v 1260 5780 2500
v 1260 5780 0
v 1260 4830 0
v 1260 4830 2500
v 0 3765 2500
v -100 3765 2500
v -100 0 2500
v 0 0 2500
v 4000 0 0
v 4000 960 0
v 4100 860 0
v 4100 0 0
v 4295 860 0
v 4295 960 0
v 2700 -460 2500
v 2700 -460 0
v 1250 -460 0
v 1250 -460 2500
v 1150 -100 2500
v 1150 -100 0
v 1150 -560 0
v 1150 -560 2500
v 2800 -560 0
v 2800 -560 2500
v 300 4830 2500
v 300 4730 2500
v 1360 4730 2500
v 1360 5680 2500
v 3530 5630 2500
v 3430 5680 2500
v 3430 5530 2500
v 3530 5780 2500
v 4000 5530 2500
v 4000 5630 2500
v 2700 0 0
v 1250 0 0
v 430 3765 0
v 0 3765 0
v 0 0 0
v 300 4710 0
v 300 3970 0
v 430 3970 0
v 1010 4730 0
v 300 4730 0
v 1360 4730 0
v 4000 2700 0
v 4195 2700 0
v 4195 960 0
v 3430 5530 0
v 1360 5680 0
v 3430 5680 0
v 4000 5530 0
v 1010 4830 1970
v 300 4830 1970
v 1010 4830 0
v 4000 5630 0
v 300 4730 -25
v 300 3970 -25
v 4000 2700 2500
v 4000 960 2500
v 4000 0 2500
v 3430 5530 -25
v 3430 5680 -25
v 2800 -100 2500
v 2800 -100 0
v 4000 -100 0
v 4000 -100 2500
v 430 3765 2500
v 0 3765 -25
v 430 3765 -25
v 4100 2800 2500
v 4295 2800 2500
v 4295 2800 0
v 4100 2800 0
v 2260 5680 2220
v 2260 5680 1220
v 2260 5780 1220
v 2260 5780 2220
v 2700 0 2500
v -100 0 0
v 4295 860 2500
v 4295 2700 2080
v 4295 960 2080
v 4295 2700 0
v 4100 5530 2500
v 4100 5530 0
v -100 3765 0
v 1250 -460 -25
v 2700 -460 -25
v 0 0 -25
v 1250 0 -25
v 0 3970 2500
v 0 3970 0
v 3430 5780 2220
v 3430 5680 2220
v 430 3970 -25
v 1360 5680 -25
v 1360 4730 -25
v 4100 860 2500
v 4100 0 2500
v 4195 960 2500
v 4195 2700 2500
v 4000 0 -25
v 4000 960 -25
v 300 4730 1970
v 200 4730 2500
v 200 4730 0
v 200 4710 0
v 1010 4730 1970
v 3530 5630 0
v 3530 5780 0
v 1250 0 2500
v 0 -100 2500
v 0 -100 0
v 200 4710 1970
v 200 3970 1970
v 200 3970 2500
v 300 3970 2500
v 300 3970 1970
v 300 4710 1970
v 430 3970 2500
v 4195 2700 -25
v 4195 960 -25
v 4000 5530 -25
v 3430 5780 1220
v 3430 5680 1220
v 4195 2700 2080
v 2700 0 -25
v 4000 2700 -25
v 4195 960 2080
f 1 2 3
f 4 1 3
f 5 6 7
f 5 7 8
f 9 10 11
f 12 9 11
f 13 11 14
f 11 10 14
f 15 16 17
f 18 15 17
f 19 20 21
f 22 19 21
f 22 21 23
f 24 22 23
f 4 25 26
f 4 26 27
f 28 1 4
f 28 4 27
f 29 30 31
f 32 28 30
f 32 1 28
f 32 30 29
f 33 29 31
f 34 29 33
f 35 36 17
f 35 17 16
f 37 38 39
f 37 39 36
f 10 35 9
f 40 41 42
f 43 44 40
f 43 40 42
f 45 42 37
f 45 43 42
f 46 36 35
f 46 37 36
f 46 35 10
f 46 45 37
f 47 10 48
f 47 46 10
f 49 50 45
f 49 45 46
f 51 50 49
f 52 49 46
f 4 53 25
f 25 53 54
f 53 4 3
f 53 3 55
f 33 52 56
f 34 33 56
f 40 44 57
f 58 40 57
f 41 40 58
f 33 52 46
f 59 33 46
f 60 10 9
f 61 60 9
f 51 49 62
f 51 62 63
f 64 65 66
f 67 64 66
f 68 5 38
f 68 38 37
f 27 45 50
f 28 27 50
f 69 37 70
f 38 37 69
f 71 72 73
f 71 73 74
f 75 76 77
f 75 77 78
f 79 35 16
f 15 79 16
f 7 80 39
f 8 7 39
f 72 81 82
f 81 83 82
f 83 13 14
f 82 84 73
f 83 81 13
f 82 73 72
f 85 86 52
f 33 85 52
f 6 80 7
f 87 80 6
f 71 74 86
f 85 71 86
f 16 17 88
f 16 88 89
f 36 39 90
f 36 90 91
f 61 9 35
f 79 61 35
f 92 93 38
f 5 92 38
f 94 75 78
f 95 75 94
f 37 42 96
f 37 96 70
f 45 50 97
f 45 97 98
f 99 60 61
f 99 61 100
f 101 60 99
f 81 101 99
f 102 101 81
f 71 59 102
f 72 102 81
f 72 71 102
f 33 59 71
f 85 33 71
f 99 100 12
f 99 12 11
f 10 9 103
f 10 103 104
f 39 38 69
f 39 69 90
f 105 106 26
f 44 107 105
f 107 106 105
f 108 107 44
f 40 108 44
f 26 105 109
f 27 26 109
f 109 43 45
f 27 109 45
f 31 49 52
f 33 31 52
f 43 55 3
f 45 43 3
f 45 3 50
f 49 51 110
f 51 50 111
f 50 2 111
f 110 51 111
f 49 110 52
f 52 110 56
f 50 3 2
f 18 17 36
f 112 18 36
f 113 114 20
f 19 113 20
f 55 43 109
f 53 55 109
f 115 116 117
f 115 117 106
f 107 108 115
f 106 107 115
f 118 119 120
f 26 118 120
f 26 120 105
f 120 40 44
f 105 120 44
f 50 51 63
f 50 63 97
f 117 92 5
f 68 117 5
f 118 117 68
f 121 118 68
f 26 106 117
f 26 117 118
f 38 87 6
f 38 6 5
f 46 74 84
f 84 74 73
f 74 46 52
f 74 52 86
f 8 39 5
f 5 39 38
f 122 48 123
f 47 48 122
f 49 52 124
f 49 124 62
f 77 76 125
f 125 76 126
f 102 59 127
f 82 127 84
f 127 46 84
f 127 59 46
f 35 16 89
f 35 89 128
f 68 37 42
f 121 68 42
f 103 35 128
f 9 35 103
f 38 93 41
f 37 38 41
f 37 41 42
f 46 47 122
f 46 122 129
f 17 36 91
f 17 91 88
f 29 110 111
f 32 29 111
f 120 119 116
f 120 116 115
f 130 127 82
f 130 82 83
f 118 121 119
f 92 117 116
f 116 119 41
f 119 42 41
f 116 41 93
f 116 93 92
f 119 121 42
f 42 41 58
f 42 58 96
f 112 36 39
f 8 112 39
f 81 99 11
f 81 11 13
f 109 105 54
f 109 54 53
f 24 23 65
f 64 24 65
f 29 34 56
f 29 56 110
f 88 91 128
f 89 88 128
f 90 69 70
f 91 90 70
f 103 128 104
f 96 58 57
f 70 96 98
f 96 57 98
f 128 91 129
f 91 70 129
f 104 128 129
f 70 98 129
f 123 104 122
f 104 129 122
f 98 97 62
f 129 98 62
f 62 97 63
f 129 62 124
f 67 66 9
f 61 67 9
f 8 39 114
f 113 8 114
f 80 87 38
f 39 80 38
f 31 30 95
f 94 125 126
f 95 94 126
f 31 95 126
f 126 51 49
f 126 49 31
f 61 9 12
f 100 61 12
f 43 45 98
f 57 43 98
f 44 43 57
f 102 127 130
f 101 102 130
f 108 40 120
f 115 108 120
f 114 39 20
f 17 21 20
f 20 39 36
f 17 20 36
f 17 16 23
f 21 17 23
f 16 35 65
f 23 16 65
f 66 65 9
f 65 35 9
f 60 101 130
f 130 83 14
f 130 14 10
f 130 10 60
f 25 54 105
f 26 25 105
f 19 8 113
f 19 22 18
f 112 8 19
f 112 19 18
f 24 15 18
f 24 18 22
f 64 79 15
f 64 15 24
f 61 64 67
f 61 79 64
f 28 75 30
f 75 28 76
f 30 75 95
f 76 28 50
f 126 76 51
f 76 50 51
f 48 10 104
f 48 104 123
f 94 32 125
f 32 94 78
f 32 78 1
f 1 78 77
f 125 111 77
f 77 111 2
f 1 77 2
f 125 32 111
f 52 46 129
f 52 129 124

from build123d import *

# Parameters (mm, degrees)
F1_DEPTH  = 25
F2_W      = 100
F2_H      = 3765
F3_DEPTH  = 2500
F5_DEPTH  = 2500
F7_DEPTH  = 2500
F9_DEPTH  = 2500
F11_DEPTH = 2500
F12_W     = 100
F12_H     = 760
F13_DEPTH = 2500
F14_W     = 1170
F14_H     = 1000
F15_DEPTH = 100.001
F16_W     = 740
F16_H     = 1970
F17_DEPTH = 400.001
F18_W     = 710
F18_H     = 1970
F19_DEPTH = 1050.001
F20_W     = 1740
F20_H     = 2080
F21_DEPTH = 100.001


with BuildPart() as f1:
    # F0 (on Top) → F1 (new body)
    with BuildSketch(Plane.XY):
        Polygon((0, 3765), (0, 0), (1250, 0), (1250, -460), (2700, -460), (2700, 0), (4000, 0), (4000, 960), (4195, 960), (4195, 2700), (4000, 2700), (4000, 5530), (3430, 5530), (3430, 5680), (1360, 5680), (1360, 4730), (300, 4730), (300, 3970), (430, 3970), (430, 3765), align=None)
    extrude(amount=-F1_DEPTH)



with BuildPart() as f3:
    # F2 (on face) → F3 (new body)
    with BuildSketch(Plane.XY):
        with Locations((-50, 1882.5)):
            Rectangle(F2_W, F2_H)
    extrude(amount=F3_DEPTH)


with BuildPart() as f5:
    # F4 (on face) → F5 (new body)
    with BuildSketch(Plane.XY):
        Polygon((1250, 0), (0, 0), (0, -100), (1150, -100), (1150, -560), (2800, -560), (2800, -100), (4000, -100), (4000, 0), (2700, 0), (2700, -460), (1250, -460), align=None)
    extrude(amount=F5_DEPTH)


with BuildPart() as f7:
    # F6 (on face) → F7 (new body)
    with BuildSketch(Plane.XY):
        Polygon((4000, 960), (4000, 0), (4100, 0), (4100, 860), (4295, 860), (4295, 2800), (4100, 2800), (4100, 5530), (4000, 5530), (4000, 2700), (4195, 2700), (4195, 960), align=None)
    extrude(amount=F7_DEPTH)

    # F20 (on face) → F21 (cut, through all)
    with BuildSketch(Plane(origin=(4195, 0, 0), x_dir=(0, -1, 0), z_dir=(-1, 0, 0))):
        with Locations((-1830, 1040)):
            Rectangle(F20_W, F20_H)
    extrude(amount=-F21_DEPTH, mode=Mode.SUBTRACT)


with BuildPart() as f9:
    # F8 (on face) → F9 (new body)
    with BuildSketch(Plane.XY):
        Polygon((0, 3765), (430, 3765), (430, 3970), (300, 3970), (0, 3970), align=None)
    extrude(amount=F9_DEPTH)


with BuildPart() as f11:
    # F10 (on face) → F11 (new body)
    with BuildSketch(Plane.XY):
        Polygon((3430, 5530), (4000, 5530), (4000, 5630), (3530, 5630), (3530, 5780), (1260, 5780), (1260, 4830), (300, 4830), (300, 4730), (1360, 4730), (1360, 5680), (3430, 5680), align=None)
    extrude(amount=F11_DEPTH)


with BuildPart() as f1_1:
    add(f1.part)

    add(f9.part)  # F13 merges F9

    add(f11.part)  # F13 merges F11
    # F12 (on face) → F13 (join)
    with BuildSketch(Plane.XY):
        with Locations((250, 4350)):
            Rectangle(F12_W, F12_H)
    extrude(amount=F13_DEPTH)

    # F14 (on face) → F15 (cut, through all)
    with BuildSketch(Plane.XZ.offset(-5680)):
        with Locations((2845, 1720)):
            Rectangle(F14_W, F14_H)
    extrude(amount=-F15_DEPTH, mode=Mode.SUBTRACT)

    # F16 (on face) → F17 (cut, through all)
    with BuildSketch(Plane.YZ.offset(300)):
        with Locations((4340, 985)):
            Rectangle(F16_W, F16_H)
    extrude(amount=-F17_DEPTH, mode=Mode.SUBTRACT)

    # F18 (on face) → F19 (cut, through all)
    with BuildSketch(Plane.XZ.offset(-4730)):
        with Locations((655, 985)):
            Rectangle(F18_W, F18_H)
    extrude(amount=-F19_DEPTH, mode=Mode.SUBTRACT)


solid = Compound([f3.part, f5.part, f7.part, f1_1.part])
